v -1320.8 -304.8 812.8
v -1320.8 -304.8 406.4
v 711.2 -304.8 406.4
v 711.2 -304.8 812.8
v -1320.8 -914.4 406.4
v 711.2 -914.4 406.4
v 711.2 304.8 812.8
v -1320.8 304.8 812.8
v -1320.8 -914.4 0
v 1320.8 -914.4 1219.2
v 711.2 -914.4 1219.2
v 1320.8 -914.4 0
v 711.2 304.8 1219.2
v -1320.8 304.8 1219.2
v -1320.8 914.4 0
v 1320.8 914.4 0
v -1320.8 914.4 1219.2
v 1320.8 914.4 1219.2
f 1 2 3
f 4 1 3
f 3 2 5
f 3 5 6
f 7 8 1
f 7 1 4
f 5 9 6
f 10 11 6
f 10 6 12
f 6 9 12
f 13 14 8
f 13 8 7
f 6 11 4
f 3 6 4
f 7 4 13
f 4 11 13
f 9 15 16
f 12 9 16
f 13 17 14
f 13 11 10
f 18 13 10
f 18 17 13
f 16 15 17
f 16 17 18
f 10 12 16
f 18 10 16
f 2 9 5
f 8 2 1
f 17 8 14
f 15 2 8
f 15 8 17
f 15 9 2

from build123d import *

# Parameters (mm, degrees)
F0_W     = 2641.6
F0_H     = 1828.8
F1_DEPTH = 1219.2
F2_W     = 2032
F2_H     = 1219.2
F3_DEPTH = 812.8
F4_W     = 2032
F4_H     = 609.6
F5_DEPTH = 406.4


with BuildPart() as f1:
    # F0 (on Top) → F1 (new body)
    with BuildSketch(Plane.XY):
        Rectangle(F0_W, F0_H)
    extrude(amount=F1_DEPTH)

    # F2 (on face) → F3 (cut)
    with BuildSketch(Plane.XY.offset(1219.2)):
        with Locations((-304.8, -304.8)):
            Rectangle(F2_W, F2_H)
    extrude(amount=-F3_DEPTH, mode=Mode.SUBTRACT)

    # F4 (on face) → F5 (join)
    with BuildSketch(Plane.XY.offset(406.4)):
        with Locations((-304.8, 0)):
            Rectangle(F4_W, F4_H)
    extrude(amount=F5_DEPTH)


solid = f1.part
